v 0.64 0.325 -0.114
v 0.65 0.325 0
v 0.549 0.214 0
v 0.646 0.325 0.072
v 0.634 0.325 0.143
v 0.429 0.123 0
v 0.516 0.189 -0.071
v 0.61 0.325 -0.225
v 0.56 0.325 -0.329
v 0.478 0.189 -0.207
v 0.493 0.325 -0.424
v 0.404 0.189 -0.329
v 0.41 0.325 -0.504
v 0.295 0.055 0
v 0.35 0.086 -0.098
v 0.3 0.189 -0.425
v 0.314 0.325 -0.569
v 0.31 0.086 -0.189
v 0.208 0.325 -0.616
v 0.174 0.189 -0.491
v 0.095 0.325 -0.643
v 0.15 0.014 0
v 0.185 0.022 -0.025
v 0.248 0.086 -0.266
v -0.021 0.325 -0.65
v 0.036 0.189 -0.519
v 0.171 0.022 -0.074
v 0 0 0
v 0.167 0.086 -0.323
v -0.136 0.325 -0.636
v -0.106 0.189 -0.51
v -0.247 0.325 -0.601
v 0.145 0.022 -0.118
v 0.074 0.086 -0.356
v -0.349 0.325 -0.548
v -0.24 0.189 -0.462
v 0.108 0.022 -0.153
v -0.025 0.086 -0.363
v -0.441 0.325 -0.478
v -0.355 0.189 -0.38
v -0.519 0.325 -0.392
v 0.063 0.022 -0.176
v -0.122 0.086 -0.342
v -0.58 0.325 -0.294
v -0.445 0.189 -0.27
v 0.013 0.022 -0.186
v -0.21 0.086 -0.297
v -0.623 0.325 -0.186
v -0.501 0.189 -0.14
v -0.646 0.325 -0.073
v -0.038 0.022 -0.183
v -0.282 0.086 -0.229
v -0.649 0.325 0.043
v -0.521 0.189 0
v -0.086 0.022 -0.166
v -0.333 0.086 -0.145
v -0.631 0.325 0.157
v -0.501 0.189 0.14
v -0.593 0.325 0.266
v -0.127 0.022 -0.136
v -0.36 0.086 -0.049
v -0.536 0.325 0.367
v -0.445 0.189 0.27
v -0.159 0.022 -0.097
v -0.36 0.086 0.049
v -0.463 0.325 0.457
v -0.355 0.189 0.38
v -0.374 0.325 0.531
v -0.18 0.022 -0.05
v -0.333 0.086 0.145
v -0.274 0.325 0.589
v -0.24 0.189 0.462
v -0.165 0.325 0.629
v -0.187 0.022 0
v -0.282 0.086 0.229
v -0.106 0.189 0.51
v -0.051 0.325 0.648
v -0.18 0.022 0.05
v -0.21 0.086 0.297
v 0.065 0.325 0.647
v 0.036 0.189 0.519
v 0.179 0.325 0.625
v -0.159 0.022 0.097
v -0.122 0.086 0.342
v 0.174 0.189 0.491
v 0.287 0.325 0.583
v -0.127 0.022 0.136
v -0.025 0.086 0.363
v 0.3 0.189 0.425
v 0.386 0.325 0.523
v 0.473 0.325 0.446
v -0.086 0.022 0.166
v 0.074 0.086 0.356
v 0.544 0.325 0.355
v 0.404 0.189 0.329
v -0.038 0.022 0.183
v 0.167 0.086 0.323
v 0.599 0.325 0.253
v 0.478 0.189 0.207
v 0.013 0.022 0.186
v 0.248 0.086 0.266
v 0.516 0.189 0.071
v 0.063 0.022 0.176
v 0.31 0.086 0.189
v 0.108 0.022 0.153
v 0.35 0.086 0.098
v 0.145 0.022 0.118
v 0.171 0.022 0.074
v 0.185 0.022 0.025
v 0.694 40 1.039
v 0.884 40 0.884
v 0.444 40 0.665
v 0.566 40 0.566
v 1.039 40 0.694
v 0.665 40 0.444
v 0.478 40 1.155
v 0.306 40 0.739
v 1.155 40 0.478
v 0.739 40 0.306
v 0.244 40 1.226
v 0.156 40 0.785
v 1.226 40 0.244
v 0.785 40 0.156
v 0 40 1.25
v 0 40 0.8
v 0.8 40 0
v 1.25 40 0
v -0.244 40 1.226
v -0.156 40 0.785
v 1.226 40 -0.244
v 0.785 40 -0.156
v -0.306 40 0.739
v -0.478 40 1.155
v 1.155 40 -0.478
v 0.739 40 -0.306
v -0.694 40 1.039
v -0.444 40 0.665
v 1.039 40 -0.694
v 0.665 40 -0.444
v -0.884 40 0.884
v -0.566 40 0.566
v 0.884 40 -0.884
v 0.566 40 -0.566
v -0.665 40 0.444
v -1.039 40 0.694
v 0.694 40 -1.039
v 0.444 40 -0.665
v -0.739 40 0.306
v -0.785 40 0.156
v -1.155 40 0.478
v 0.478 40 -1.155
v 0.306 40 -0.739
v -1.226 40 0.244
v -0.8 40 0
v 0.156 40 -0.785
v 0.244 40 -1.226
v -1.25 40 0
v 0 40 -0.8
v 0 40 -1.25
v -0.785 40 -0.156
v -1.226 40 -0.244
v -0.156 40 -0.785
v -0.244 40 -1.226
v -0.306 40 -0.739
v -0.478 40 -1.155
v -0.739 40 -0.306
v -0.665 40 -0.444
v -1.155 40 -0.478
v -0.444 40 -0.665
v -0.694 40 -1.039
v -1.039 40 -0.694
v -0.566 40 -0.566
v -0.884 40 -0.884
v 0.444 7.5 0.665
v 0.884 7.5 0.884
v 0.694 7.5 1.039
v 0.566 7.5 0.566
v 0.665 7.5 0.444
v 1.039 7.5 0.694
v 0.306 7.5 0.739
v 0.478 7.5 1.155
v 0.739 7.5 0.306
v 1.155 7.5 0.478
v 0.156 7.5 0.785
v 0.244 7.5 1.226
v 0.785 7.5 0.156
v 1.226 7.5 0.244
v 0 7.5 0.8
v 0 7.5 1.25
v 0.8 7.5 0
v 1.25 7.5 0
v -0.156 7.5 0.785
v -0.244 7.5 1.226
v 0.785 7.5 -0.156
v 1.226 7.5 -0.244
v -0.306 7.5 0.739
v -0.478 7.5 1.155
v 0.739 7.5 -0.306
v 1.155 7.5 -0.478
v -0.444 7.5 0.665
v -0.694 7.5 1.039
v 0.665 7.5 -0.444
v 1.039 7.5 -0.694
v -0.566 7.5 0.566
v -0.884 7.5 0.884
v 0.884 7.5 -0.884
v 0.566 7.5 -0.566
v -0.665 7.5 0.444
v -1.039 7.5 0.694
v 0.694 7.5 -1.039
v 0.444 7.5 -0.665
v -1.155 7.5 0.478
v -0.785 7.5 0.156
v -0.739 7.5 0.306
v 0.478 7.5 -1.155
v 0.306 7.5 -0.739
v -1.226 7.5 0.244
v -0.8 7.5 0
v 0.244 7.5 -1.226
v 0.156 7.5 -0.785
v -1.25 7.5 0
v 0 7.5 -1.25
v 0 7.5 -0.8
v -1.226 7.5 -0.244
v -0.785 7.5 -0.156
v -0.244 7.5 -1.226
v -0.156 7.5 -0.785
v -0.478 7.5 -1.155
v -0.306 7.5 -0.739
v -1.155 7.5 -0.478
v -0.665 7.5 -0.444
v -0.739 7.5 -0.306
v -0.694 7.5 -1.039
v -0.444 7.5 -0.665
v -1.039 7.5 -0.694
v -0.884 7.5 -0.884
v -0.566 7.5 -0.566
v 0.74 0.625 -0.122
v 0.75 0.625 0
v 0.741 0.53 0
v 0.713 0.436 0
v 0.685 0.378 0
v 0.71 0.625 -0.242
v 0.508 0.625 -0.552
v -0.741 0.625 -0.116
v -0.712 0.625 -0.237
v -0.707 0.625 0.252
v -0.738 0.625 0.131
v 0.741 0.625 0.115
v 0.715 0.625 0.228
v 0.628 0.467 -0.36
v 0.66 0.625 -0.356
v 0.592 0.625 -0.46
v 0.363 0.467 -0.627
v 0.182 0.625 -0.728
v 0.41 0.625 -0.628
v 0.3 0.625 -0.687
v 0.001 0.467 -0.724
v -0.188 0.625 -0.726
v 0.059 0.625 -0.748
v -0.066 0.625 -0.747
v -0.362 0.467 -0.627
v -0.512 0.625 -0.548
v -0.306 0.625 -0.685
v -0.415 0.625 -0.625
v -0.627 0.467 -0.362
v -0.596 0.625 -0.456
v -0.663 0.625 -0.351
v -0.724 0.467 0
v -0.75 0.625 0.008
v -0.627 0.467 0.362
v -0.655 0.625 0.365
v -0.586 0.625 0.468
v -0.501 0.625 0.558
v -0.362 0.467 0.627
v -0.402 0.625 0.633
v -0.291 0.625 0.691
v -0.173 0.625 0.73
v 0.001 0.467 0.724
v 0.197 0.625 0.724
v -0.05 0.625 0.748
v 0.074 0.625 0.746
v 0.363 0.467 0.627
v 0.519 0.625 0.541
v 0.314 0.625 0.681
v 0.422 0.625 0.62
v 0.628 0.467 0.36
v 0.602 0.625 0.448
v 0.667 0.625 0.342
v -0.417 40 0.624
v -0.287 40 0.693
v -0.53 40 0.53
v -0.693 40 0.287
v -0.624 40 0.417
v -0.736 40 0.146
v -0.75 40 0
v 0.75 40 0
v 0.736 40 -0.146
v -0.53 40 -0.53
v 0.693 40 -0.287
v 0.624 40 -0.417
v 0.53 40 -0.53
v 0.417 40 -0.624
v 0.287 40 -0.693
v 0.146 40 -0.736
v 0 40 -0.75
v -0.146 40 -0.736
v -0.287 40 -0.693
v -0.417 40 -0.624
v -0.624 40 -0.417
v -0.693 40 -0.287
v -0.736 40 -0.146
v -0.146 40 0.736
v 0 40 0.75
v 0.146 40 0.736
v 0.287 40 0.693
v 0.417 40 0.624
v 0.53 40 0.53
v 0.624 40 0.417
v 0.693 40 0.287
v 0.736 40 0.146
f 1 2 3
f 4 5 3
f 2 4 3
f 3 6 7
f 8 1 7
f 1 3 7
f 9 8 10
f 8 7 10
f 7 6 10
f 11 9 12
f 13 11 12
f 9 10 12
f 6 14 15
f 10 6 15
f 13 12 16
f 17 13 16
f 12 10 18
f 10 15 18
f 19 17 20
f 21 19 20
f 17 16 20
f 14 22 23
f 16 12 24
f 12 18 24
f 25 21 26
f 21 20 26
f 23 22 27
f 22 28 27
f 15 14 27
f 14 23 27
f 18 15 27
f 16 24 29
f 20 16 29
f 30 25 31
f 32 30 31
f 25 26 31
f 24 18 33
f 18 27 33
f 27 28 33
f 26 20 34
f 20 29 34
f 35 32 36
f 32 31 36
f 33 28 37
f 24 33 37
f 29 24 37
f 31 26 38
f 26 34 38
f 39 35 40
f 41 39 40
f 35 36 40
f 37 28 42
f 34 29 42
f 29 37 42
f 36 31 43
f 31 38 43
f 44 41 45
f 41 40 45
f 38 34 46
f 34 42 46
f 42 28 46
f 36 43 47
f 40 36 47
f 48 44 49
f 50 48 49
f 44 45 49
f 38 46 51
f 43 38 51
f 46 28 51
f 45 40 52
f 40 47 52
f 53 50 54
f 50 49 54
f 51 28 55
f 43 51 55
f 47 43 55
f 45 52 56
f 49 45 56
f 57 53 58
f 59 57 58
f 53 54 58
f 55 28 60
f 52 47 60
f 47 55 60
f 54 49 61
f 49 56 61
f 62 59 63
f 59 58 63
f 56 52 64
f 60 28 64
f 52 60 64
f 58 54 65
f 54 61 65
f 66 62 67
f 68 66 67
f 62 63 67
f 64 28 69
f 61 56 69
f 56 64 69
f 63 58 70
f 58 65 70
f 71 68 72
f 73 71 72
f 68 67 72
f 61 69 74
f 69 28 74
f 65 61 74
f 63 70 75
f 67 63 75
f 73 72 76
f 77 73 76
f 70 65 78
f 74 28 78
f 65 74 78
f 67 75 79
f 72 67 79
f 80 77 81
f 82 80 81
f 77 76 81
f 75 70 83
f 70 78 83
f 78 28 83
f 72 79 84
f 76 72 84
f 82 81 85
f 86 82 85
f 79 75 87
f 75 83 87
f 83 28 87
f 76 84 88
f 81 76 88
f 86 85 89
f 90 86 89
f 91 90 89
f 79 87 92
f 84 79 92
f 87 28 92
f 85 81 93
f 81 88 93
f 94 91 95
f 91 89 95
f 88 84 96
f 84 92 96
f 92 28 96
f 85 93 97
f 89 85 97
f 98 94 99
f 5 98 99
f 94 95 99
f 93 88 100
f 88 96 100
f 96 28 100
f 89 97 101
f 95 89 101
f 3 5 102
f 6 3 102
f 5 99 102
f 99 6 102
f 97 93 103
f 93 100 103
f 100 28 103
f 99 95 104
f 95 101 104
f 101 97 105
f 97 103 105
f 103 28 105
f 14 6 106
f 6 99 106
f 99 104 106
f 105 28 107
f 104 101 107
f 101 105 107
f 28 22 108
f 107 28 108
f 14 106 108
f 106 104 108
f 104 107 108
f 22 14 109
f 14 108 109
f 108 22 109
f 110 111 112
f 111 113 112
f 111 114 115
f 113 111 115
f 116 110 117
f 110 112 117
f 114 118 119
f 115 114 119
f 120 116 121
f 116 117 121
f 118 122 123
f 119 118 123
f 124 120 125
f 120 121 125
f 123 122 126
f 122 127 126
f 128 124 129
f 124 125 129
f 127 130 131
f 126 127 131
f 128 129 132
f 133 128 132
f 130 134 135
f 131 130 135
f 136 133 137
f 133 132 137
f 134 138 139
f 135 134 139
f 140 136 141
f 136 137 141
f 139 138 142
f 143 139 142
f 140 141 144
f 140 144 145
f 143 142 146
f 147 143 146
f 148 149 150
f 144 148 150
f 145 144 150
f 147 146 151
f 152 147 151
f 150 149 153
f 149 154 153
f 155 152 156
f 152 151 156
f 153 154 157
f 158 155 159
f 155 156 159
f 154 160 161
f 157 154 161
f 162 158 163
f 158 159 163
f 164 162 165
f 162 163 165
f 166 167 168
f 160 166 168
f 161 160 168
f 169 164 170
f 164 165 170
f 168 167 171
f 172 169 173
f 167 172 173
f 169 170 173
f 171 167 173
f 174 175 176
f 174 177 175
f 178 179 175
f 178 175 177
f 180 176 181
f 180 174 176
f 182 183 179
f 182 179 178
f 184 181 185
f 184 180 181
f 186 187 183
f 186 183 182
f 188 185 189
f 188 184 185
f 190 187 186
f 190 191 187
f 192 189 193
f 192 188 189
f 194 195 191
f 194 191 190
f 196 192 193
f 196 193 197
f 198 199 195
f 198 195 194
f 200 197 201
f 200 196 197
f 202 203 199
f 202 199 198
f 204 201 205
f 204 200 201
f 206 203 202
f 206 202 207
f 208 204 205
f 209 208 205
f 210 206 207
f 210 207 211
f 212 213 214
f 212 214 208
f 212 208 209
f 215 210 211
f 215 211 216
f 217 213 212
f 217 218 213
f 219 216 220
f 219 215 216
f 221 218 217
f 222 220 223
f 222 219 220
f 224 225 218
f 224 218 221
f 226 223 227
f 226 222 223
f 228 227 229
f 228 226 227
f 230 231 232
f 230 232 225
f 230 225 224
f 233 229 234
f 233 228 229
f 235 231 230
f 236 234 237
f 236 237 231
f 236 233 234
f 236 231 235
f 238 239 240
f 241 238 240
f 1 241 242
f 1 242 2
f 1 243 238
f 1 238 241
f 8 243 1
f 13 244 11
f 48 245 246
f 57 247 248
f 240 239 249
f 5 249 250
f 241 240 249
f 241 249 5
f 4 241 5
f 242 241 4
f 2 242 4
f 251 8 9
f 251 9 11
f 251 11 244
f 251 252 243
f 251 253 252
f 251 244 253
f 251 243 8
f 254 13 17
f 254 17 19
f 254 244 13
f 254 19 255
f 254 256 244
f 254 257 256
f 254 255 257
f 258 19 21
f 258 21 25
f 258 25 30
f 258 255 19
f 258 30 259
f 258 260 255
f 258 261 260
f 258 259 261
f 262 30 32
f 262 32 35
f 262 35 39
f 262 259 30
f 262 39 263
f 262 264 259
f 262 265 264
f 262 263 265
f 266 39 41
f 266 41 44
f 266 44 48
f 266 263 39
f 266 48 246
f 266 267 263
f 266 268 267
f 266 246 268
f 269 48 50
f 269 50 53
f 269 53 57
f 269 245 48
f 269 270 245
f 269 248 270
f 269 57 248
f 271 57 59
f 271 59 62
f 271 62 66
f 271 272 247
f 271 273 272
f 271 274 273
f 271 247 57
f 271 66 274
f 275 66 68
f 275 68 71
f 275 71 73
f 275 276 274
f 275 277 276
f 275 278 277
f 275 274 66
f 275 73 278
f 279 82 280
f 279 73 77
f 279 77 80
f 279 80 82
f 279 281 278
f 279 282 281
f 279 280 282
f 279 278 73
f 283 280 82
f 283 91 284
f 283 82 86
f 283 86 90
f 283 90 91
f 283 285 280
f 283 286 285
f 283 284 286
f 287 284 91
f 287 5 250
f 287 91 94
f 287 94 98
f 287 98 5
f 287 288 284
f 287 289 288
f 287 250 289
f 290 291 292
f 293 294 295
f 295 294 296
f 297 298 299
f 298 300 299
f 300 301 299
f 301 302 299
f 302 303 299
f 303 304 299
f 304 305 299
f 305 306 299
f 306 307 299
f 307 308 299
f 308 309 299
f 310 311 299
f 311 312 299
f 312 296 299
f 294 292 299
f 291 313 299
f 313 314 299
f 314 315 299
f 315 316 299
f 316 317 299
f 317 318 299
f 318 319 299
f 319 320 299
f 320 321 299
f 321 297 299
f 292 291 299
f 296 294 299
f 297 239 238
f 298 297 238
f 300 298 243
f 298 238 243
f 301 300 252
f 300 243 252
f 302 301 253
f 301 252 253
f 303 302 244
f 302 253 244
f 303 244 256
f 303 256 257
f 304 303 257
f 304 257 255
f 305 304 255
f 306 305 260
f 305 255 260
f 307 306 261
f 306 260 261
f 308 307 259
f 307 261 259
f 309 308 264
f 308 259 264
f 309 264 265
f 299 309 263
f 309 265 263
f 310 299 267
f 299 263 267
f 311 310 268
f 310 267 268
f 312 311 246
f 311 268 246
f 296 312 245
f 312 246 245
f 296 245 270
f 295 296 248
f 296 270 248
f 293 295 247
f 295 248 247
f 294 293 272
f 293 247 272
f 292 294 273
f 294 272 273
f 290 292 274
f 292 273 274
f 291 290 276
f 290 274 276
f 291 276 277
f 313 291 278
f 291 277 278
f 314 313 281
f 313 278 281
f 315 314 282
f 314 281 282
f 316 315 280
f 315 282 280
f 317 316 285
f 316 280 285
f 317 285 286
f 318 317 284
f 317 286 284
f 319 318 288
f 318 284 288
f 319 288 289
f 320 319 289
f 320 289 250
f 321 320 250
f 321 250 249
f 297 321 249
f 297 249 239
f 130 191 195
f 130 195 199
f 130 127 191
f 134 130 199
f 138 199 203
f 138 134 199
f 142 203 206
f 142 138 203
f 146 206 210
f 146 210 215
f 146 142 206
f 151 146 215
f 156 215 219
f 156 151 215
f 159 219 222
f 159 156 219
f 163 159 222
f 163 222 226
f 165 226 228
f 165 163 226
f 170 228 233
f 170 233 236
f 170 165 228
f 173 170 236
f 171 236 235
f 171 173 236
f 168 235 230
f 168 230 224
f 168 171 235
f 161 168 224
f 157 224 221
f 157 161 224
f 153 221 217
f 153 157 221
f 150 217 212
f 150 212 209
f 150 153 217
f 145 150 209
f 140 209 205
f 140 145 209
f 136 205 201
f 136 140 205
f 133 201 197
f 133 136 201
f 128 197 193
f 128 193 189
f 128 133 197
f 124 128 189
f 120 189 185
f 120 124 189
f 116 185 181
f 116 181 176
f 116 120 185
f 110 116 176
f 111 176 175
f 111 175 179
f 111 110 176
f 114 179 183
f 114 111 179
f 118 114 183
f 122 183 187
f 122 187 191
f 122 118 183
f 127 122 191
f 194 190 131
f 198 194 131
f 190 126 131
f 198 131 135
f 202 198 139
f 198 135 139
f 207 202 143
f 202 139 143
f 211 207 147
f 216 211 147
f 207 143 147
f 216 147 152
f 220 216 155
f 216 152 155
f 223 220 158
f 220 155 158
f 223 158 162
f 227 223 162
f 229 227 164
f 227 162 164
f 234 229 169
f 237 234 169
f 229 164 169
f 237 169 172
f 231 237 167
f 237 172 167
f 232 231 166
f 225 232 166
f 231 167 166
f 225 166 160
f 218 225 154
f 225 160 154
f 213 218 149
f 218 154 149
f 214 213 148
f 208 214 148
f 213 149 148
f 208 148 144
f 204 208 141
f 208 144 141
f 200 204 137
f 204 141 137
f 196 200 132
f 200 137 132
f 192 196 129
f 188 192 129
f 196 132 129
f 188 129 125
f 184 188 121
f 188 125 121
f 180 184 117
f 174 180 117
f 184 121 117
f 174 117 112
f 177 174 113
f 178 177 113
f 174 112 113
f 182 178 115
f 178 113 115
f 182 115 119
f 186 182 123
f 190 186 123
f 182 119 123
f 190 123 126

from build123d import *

# Parameters (mm, degrees)
SKETCH1_W = 0.45
SKETCH1_H = 32.5
FILLET1_R = 0.5


with BuildPart() as part:
    # Sketch1 → Revolve1 (revolve)
    with BuildSketch(Plane.XY):
        with BuildLine():
            Line((0, 0), (0, 40))
            Line((0, 40), (0.75, 40))
            Line((0.75, 40), (0.75, 0.5))
            ThreePointArc((0.75, 0.5), (0.450693909, 0.136459136), (0, 0))
        make_face()
        with Locations((1.025, 23.75)):
            Rectangle(SKETCH1_W, SKETCH1_H)
    revolve(axis=Axis((0, 0, 0), (0, 1, 0)))

    # Fillet1
    fillet1_edges = [part.edges().sort_by_distance(p)[0] for p in [
        (-0.75, 0.5, 0),
    ]]
    fillet(fillet1_edges, radius=FILLET1_R)


solid = part.part
